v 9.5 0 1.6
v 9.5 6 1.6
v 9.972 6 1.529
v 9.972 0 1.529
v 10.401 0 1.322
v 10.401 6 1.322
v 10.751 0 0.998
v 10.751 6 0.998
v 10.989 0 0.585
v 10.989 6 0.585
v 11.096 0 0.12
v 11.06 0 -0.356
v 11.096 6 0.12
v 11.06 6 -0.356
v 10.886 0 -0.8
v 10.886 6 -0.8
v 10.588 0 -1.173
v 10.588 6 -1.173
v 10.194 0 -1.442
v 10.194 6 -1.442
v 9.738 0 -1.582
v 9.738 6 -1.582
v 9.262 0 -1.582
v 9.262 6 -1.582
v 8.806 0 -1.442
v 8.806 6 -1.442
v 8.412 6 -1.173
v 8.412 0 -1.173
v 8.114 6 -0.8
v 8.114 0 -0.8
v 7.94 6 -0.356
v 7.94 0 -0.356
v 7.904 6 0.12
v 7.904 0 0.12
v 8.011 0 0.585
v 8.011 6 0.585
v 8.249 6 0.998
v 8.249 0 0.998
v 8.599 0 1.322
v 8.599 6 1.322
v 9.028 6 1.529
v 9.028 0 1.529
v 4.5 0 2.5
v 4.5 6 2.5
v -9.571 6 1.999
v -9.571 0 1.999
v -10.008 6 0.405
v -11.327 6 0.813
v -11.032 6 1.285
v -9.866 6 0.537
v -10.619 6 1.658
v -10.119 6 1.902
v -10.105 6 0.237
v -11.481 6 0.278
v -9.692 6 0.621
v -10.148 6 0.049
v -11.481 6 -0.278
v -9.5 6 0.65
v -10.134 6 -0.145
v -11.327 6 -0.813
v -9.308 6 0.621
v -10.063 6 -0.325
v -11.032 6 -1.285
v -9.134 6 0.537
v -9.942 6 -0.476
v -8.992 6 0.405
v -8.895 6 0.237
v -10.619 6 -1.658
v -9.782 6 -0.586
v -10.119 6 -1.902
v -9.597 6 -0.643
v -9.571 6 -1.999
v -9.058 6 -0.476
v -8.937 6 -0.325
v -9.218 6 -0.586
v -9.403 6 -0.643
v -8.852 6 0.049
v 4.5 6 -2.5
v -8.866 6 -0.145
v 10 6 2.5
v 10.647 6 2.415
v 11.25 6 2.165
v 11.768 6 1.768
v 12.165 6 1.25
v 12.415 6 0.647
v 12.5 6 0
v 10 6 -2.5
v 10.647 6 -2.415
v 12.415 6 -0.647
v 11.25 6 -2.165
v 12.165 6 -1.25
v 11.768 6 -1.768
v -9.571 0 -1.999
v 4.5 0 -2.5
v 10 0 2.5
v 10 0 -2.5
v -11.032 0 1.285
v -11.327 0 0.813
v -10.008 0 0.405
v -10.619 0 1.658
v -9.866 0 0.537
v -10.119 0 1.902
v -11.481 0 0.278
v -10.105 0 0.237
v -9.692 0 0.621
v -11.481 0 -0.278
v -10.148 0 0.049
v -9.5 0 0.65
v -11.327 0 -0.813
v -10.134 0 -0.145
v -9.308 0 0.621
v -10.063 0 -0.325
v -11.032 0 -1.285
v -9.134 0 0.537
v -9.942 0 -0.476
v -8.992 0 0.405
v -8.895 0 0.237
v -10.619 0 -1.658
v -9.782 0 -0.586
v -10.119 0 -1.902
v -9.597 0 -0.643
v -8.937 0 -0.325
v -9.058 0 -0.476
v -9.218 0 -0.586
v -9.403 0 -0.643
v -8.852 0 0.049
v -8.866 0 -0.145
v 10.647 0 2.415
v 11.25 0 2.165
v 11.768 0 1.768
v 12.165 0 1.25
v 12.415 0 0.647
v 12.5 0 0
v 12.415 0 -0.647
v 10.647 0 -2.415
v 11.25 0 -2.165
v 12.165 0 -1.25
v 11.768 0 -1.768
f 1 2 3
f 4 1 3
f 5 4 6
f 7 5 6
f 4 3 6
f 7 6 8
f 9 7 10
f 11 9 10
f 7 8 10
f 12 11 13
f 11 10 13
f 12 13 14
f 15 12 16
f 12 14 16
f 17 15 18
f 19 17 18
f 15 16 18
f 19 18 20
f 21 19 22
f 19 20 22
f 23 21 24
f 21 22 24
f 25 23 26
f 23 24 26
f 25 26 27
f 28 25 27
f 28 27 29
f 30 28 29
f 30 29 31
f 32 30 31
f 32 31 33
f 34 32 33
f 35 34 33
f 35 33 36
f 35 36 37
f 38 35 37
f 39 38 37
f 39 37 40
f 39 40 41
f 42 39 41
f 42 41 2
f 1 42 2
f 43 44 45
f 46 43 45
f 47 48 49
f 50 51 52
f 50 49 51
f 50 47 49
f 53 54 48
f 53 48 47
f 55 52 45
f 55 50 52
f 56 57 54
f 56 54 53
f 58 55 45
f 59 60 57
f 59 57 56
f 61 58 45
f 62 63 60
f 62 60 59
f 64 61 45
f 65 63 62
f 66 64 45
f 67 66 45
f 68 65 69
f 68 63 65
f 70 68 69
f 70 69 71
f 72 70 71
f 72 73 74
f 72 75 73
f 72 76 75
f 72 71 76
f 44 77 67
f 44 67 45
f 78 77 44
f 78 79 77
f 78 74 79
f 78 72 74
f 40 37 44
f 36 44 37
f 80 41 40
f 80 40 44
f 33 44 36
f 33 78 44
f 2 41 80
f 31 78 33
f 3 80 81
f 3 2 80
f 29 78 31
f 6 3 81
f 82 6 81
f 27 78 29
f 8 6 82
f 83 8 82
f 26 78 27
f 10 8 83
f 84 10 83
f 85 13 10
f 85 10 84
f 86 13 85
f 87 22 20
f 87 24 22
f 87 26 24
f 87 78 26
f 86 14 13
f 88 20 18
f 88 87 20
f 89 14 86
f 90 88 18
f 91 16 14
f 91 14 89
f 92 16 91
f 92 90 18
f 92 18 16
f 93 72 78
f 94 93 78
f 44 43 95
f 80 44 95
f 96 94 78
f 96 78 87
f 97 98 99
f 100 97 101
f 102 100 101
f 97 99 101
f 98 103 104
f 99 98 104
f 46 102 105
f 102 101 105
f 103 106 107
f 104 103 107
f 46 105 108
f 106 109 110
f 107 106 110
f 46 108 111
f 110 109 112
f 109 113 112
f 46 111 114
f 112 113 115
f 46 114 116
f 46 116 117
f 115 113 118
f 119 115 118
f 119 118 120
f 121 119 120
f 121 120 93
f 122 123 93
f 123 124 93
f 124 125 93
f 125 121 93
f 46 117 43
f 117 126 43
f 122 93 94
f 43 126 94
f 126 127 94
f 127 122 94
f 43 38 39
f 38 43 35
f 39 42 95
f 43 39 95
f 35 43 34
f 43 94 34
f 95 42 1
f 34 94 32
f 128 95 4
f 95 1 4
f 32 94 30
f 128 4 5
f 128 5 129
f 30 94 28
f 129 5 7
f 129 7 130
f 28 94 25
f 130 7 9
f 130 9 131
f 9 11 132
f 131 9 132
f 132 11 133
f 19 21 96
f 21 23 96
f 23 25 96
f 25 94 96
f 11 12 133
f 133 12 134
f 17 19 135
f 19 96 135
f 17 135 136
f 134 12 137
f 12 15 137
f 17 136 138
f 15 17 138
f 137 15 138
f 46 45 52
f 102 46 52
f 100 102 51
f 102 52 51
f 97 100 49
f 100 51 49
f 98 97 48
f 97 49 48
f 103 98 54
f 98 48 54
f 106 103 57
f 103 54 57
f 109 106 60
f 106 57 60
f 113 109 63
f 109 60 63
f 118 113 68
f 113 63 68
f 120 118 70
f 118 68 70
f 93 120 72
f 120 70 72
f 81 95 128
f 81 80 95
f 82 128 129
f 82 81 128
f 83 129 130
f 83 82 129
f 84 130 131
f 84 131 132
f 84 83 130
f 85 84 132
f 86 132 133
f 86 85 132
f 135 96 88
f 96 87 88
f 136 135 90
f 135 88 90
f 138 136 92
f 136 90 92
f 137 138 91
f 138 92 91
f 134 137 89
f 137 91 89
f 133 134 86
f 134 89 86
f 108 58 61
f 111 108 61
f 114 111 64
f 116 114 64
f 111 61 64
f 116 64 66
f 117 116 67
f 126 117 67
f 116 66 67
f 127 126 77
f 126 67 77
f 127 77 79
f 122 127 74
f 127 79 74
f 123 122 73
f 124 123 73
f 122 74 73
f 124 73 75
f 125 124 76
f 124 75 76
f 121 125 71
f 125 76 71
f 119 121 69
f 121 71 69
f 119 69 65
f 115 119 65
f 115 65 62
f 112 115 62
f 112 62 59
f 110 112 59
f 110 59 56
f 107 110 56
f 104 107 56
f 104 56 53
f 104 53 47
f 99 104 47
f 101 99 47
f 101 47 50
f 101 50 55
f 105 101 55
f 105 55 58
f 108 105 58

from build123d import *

# Parameters (mm, degrees)
SKETCH_1_W          = 25
SKETCH_1_H          = 5
EXTRUDE_1_DEPTH     = 6
SKETCH_2_R          = 1.6
SKETCH_2_R_2        = 0.65
CUT_EXTRUDE_1_DEPTH = 10
FILLET_1_R          = 2.5
CUT_EXTRUDE_2_DEPTH = 7


with BuildPart() as part:
    # 草图1 → 凸台-拉伸1 (new body)
    with BuildSketch(Plane(origin=(0, 0, 0), x_dir=(1, 0, 0), z_dir=(0, 1, 0))):
        Rectangle(SKETCH_1_W, SKETCH_1_H)
    extrude(amount=EXTRUDE_1_DEPTH)

    # 草图2 → 切除-拉伸1 (cut)
    with BuildSketch(Plane(origin=(0, 6, 0), x_dir=(1, 0, 0), z_dir=(0, 1, 0))):
        with Locations(Location((9.5, 0, 0), (0, 0, 270))):
            Circle(SKETCH_2_R)
        with Locations(Location((-9.5, 0, 0), (0, 0, 270))):
            Circle(SKETCH_2_R_2)
    extrude(amount=-CUT_EXTRUDE_1_DEPTH, mode=Mode.SUBTRACT)

    # 圆角1
    fillet_1_edges = [part.edges().sort_by_distance(p)[0] for p in [
        (12.5, 3, 2.5),
        (12.5, 3, -2.5),
        (-12.5, 3, 2.5),
        (-12.5, 3, -2.5),
    ]]
    fillet(fillet_1_edges, radius=FILLET_1_R - 0.0001)  # a hair under: the kernel refuses the full size

    # 草图3 → 切除-拉伸2 (cut)
    with BuildSketch(Plane(origin=(0, 6, 0), x_dir=(1, 0, 0), z_dir=(0, 1, 0))):
        with BuildLine():
            Line((-9.571202172, 1.998732161), (4.5, 2.5))
            Line((4.5, 2.5), (-10, 2.5))
            ThreePointArc((-10, 2.5), (-11.767766953, 1.767766953), (-12.5, 0))
            ThreePointArc((-12.5, 0), (-11.767766953, -1.767766953), (-10, -2.5))
            Line((-10, -2.5), (4.5, -2.5))
            Line((4.5, -2.5), (-9.571202172, -1.998732161))
            ThreePointArc((-9.571202172, -1.998732161), (-11.5, 0), (-9.571202172, 1.998732161))
        make_face()
    extrude(amount=-CUT_EXTRUDE_2_DEPTH, mode=Mode.SUBTRACT)


with BuildPart() as cut_extrude_2_kept_piece:
    # of the separate pieces the step leaves, the one the design keeps (cut_extrude_2_pieces_kept)
    add(part.part.solids().sort_by_distance((4.5, 0, -2.5))[0])


solid = cut_extrude_2_kept_piece.part
